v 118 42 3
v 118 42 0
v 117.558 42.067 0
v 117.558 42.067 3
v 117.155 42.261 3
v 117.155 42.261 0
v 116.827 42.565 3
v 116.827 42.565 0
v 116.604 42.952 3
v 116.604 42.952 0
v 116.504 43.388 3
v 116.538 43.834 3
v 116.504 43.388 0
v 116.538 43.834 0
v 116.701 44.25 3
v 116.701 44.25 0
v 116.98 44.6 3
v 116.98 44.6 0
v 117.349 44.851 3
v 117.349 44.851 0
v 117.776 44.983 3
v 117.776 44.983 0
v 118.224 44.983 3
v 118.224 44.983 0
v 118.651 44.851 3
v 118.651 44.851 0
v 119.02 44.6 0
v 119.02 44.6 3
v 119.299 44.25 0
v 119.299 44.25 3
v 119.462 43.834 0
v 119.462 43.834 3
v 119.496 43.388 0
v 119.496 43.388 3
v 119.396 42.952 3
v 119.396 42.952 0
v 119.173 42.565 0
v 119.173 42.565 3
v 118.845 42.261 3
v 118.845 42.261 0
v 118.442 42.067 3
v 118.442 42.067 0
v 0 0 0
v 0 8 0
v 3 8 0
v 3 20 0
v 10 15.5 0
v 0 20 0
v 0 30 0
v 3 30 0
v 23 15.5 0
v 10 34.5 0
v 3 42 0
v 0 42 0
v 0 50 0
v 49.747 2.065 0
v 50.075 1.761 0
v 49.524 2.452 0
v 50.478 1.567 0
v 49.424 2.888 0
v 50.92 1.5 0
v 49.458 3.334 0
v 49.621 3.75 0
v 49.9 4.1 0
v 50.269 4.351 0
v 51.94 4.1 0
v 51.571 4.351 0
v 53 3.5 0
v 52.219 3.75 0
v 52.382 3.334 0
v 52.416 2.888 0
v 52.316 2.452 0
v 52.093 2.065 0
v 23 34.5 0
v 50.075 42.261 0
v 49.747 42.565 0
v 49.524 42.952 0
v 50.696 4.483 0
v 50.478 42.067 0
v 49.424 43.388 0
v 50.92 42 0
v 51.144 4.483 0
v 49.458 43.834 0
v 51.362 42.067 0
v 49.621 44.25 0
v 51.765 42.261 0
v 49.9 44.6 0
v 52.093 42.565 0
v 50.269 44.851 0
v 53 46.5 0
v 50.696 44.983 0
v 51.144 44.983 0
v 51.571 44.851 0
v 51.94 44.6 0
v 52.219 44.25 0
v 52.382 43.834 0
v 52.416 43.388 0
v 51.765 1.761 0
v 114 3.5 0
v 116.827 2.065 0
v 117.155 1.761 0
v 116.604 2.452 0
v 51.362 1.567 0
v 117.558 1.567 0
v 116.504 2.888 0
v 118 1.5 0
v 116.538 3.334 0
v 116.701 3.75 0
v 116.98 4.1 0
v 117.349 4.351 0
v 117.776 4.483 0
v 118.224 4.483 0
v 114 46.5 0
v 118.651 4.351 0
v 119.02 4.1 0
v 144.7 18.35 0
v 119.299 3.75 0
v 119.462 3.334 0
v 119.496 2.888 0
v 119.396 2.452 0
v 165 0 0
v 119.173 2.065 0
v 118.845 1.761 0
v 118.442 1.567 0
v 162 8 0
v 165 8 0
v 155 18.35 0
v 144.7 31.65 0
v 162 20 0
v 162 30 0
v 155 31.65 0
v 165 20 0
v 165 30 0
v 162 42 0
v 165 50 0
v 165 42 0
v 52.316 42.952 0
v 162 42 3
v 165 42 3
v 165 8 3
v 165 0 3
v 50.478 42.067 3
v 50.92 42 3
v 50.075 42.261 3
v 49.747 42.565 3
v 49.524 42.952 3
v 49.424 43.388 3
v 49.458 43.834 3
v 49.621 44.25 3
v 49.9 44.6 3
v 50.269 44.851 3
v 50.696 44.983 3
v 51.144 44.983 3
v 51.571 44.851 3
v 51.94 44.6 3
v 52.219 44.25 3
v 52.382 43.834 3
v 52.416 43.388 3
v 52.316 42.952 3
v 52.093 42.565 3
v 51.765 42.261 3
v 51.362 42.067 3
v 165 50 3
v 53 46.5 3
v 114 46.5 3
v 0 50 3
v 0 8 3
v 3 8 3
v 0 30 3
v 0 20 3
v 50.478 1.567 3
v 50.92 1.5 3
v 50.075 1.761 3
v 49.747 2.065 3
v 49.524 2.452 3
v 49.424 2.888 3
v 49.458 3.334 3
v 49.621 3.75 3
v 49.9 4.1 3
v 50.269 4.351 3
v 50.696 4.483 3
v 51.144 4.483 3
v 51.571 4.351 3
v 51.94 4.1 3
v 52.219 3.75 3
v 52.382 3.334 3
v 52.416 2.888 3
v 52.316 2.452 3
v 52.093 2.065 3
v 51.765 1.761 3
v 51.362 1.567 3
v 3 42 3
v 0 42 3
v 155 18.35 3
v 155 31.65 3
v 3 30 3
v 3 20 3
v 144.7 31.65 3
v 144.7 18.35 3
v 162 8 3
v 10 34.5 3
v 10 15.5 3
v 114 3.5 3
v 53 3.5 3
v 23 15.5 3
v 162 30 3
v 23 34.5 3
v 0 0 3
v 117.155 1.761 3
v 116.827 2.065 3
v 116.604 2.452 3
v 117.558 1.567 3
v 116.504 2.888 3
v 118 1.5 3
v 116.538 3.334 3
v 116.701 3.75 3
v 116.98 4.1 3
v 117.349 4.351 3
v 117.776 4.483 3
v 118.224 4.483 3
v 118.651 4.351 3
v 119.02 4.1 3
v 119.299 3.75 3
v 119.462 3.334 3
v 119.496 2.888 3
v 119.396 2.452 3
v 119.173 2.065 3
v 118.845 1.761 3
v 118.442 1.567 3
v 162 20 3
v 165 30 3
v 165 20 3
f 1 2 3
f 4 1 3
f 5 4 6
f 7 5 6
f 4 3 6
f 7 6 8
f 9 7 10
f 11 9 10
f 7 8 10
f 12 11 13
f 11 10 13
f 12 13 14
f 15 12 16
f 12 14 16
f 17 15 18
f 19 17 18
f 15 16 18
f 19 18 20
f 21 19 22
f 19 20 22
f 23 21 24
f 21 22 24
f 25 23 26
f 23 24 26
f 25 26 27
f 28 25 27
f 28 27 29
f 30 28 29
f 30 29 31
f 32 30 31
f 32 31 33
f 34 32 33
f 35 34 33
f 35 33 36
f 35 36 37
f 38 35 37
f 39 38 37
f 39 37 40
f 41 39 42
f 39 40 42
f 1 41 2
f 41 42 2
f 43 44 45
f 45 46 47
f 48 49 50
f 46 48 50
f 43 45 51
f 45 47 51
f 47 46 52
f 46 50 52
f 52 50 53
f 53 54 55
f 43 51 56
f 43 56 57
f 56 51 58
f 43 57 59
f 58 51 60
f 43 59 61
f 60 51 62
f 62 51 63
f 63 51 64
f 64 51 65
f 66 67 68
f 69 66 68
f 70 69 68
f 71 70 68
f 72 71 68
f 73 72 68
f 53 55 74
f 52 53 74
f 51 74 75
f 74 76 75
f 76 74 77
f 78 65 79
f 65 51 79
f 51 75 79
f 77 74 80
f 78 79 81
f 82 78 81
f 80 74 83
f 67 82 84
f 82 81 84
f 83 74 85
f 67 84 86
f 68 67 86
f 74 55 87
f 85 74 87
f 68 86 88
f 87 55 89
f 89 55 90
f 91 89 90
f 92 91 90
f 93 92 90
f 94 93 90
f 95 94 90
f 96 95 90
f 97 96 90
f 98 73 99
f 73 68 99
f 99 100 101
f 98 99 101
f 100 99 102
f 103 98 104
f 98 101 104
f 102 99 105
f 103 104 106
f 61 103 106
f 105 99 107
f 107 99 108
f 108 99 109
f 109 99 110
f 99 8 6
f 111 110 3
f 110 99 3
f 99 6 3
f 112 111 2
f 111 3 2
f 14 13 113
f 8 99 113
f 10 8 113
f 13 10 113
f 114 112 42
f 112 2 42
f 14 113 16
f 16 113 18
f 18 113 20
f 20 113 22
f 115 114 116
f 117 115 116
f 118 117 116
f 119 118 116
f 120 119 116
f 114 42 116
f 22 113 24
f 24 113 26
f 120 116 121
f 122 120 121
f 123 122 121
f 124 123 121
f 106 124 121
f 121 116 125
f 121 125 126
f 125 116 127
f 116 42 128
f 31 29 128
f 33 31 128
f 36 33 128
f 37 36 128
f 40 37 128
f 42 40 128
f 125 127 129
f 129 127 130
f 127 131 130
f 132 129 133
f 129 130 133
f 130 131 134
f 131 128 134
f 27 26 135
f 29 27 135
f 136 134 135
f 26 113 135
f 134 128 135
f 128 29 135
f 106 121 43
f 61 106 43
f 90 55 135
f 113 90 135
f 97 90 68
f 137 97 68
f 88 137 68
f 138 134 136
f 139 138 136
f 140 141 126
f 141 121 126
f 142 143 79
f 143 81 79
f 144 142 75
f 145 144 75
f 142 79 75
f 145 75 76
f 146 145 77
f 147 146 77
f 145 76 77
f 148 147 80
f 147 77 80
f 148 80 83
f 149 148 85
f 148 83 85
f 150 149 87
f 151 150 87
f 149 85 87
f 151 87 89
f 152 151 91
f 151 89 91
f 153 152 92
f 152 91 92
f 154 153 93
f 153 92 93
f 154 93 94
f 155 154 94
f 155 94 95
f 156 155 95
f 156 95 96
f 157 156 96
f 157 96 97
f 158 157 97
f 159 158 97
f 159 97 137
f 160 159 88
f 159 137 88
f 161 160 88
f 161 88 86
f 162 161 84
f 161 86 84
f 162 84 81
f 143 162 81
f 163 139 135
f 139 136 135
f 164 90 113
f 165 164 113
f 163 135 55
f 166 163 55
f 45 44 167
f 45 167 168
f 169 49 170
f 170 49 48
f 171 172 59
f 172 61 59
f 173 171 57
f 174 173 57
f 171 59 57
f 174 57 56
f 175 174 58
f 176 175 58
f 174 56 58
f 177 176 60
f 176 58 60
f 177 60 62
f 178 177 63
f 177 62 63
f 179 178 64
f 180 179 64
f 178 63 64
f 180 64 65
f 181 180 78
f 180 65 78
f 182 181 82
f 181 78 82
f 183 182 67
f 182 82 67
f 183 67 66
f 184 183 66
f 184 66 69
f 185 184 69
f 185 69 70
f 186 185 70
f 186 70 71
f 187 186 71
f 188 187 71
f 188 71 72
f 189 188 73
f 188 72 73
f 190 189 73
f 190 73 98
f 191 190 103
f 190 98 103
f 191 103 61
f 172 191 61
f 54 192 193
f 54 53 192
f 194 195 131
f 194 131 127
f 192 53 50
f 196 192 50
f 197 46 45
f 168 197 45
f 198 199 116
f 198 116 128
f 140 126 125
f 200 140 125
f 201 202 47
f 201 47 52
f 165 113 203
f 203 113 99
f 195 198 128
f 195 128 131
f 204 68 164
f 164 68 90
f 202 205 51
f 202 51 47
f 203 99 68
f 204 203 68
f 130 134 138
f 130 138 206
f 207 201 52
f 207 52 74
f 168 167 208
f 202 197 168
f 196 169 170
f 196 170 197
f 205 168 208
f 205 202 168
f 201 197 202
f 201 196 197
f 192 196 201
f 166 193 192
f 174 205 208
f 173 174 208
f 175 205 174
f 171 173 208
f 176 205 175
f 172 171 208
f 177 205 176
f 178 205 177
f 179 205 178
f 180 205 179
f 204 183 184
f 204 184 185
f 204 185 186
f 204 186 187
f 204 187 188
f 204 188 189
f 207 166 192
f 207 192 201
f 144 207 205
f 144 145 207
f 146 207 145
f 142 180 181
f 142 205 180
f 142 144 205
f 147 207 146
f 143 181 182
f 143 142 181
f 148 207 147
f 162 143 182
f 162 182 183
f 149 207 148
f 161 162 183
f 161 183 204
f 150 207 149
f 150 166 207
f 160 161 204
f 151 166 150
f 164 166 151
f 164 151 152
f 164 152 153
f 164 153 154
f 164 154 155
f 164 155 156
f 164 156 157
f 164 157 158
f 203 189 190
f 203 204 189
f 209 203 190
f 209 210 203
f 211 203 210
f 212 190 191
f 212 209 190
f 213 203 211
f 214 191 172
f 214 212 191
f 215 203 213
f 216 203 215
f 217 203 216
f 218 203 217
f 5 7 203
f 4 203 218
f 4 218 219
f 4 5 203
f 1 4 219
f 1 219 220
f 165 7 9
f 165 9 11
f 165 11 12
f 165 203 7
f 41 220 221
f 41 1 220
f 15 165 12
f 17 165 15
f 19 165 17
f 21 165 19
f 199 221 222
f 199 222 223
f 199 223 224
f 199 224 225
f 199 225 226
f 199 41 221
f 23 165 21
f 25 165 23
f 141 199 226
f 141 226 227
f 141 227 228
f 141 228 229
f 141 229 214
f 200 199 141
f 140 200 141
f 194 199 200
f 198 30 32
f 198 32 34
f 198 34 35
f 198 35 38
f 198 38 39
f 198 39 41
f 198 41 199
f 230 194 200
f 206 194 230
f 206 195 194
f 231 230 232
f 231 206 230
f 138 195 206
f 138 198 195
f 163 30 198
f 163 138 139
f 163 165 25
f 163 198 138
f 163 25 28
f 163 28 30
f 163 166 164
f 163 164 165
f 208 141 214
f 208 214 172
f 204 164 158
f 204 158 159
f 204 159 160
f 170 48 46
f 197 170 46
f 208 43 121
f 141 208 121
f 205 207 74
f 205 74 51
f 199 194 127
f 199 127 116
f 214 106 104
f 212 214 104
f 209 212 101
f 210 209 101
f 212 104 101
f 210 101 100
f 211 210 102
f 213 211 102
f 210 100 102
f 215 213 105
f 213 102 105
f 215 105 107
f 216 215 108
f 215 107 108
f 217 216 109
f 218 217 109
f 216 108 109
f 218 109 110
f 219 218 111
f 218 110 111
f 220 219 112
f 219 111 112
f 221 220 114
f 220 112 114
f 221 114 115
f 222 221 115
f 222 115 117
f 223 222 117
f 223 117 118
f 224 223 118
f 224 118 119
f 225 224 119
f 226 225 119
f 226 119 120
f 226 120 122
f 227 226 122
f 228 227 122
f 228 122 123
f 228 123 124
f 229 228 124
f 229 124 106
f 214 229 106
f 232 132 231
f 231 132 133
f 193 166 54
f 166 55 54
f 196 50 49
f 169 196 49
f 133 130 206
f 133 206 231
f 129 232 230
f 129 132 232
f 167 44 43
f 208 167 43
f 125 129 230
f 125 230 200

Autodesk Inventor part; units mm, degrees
ref_plane "YZ Plane" through (0, 0, 0) normal (1, 0, 0) x (0, 1, 0)
ref_plane "XZ Plane" through (0, 0, 0) normal (0, 1, 0) x (-1, 0, 0)
ref_plane "XY Plane" through (0, 0, 0) normal (0, 0, 1) x (1, 0, 0)
sketch "Sketch1" plane through (0, 0, 0) normal (0, 0, 1) x (1, 0, 0)
  line L0 (0, 0) -> (165, 0)
  line L1 (165, 0) -> (165, 50)
  line L2 (165, 50) -> (0, 50)
  line L3 (0, 50) -> (0, 0)
  line L4 (0, 50) -> (3, 50)
  line L5 (3, 50) -> (3, 46.5)
  line L6 (3, 46.5) -> (0, 46.5)
  line L7 (0, 46.5) -> (0, 50)
  line L8 (0, 0) -> (3, 0)
  line L9 (3, 0) -> (3, 3.5)
  line L10 (3, 3.5) -> (0, 3.5)
  line L11 (0, 3.5) -> (0, 0)
  line L12 (82.5, 0) -> (82.5, 50) construction
  line L13 (162, 50) -> (162, 46.5)
  line L14 (162, 46.5) -> (165, 46.5)
  line L15 (162, 0) -> (162, 3.5)
  line L16 (162, 3.5) -> (165, 3.5)
  line L17 (44, 46.5) -> (121, 46.5) construction
  line L18 (121, 46.5) -> (121, 3.5) construction
  line L19 (121, 3.5) -> (44, 3.5) construction
  line L20 (44, 3.5) -> (44, 46.5) construction
  line L21 (53, 46.5) -> (114, 46.5)
  line L22 (114, 46.5) -> (114, 3.5)
  line L23 (114, 3.5) -> (53, 3.5)
  line L24 (53, 3.5) -> (53, 46.5)
  line L25 (3, 0) -> (0, 0)
  line L26 (0, 0) -> (0, 8)
  line L27 (0, 8) -> (3, 8)
  line L28 (3, 8) -> (3, 0)
  line L29 (0, 50) -> (3, 50)
  line L30 (3, 50) -> (3, 42)
  line L31 (3, 42) -> (0, 42)
  line L32 (0, 42) -> (0, 50)
  line L33 (0, 42) -> (3, 42)
  line L34 (3, 42) -> (3, 30)
  line L35 (3, 30) -> (0, 30)
  line L36 (0, 30) -> (0, 42)
  line L37 (3, 8) -> (0, 8)
  line L38 (0, 8) -> (0, 20)
  line L39 (0, 20) -> (3, 20)
  line L40 (3, 20) -> (3, 8)
  line L41 (165, 8) -> (162, 8)
  line L42 (162, 42) -> (165, 42)
  line L43 (162, 42) -> (162, 30)
  line L44 (162, 30) -> (165, 30)
  line L45 (165, 20) -> (162, 20)
  line L46 (162, 20) -> (162, 8)
  point P0 (1.5, 25)
  point P1 (0, 25)
  point P2 (1.5, 3.5)
  point P3 (44, 25)
  point P4 (82.5, 46.5)
  point P5 (1.5, 46.5)
  point P6 (119, 5.5)
  point P7 (119, 44.5)
  point P8 (50.5, 44.5)
  point P9 (50.5, 5.5)
  point P10 (0, 46.5)
  point P11 (0, 3.5)
  point P12 (165, 20)
  point P13 (165, 30)
  point P14 (165, 42)
  dimension "d0" = 165
  dimension "d1" = 50
  dimension "d2" = 3
  dimension "d4" = 21.5
  dimension "d5" = 21.5
  dimension "d6" = 77
  dimension "d7" = 61
  dimension "d8" = 9
  dimension "d9" = 2
  dimension "d10" = 2
  dimension "d11" = 2
  dimension "d12" = 6.5
  dimension "d13" = 2
  dimension "d34" = 8
  dimension "d35" = 8
  dimension "d36" = 12
  dimension "d37" = 12
extrude "Extrusion1" add sketch "Sketch1" along normal blind 3 contours L3 L10 L9 L0 | L9 L28 L40 L39 L3 L35 L34 L30 L5 L2 L13 L14 L1 L42 L43 L44 L45 L46 L41 L16 L15 L0 | L3 L27 L28 L10 | L15 L16 L1 L0 | L3 L6 L30 L31 | L3 L2 L5 L6 | L14 L13 L2 L1
sketch "Sketch2" plane through (0, 0, 3) normal (0, 0, 1) x (1, 0, 0)
  line L0 (53, 46.5) -> (114, 46.5) projected
  line L1 (44, 46.5) -> (121, 46.5)
  line L2 (121, 46.5) -> (121, 0)
  line L3 (121, 0) -> (44, 0)
  line L4 (44, 0) -> (44, 46.5)
  line L5 (165, 50) -> (0, 50) projected
  line L6 (0, 8) -> (0, 0) projected
  point P0 (50.92, 43.5)
  point P1 (50.92, 3)
  point P2 (82.5, 46.5)
  point P3 (82.5, 50)
  point P4 (113, 50)
  point P5 (3, 50)
  point P6 (44, 23.25)
  point P7 (0, 4)
  point P8 (0, 46.5)
  point P9 (0, 3.5)
  point P10 (118, 43.5)
  point P11 (118, 3)
  dimension "d17" = 77
  dimension "d18" = 3
  dimension "d19" = 3
  dimension "d20" = 3
  dimension "d28" = 6.92
hole "Hole1" at (50.92, 43.5, 3) at (50.92, 3, 3) at (118, 3, 3) at (118, 43.5, 3) direction (0, 0, -1) diameter 3 end through all
sketch "Sketch3" plane through (0, 0, 3) normal (0, 0, 1) x (1, 0, 0)
  line L0 (10, 34.5) -> (23, 34.5)
  line L1 (23, 34.5) -> (23, 15.5)
  line L2 (23, 15.5) -> (10, 15.5)
  line L3 (10, 15.5) -> (10, 34.5)
  line L4 (0, 8) -> (0, 0) construction
  line L5 (144.7, 31.65) -> (155, 31.65)
  line L6 (155, 31.65) -> (155, 18.35)
  line L7 (155, 18.35) -> (144.7, 18.35)
  line L8 (144.7, 18.35) -> (144.7, 31.65)
  line L9 (165, 20) -> (165, 30) projected
  line L10 (0, 30) -> (0, 20) projected
  point P0 (10, 25)
  point P1 (0, 46.5)
  point P2 (165, 25)
  point P3 (0, 25)
  point P4 (144.7, 25)
  dimension "d29" = 19
  dimension "d30" = 13
  dimension "d31" = 10
  dimension "d38" = 10.3
  dimension "d39" = 13.3
  dimension "d40" = 10
extrude "Extrusion2" cut sketch "Sketch3" against normal blind 10
properties part number "pantallaSoport"
